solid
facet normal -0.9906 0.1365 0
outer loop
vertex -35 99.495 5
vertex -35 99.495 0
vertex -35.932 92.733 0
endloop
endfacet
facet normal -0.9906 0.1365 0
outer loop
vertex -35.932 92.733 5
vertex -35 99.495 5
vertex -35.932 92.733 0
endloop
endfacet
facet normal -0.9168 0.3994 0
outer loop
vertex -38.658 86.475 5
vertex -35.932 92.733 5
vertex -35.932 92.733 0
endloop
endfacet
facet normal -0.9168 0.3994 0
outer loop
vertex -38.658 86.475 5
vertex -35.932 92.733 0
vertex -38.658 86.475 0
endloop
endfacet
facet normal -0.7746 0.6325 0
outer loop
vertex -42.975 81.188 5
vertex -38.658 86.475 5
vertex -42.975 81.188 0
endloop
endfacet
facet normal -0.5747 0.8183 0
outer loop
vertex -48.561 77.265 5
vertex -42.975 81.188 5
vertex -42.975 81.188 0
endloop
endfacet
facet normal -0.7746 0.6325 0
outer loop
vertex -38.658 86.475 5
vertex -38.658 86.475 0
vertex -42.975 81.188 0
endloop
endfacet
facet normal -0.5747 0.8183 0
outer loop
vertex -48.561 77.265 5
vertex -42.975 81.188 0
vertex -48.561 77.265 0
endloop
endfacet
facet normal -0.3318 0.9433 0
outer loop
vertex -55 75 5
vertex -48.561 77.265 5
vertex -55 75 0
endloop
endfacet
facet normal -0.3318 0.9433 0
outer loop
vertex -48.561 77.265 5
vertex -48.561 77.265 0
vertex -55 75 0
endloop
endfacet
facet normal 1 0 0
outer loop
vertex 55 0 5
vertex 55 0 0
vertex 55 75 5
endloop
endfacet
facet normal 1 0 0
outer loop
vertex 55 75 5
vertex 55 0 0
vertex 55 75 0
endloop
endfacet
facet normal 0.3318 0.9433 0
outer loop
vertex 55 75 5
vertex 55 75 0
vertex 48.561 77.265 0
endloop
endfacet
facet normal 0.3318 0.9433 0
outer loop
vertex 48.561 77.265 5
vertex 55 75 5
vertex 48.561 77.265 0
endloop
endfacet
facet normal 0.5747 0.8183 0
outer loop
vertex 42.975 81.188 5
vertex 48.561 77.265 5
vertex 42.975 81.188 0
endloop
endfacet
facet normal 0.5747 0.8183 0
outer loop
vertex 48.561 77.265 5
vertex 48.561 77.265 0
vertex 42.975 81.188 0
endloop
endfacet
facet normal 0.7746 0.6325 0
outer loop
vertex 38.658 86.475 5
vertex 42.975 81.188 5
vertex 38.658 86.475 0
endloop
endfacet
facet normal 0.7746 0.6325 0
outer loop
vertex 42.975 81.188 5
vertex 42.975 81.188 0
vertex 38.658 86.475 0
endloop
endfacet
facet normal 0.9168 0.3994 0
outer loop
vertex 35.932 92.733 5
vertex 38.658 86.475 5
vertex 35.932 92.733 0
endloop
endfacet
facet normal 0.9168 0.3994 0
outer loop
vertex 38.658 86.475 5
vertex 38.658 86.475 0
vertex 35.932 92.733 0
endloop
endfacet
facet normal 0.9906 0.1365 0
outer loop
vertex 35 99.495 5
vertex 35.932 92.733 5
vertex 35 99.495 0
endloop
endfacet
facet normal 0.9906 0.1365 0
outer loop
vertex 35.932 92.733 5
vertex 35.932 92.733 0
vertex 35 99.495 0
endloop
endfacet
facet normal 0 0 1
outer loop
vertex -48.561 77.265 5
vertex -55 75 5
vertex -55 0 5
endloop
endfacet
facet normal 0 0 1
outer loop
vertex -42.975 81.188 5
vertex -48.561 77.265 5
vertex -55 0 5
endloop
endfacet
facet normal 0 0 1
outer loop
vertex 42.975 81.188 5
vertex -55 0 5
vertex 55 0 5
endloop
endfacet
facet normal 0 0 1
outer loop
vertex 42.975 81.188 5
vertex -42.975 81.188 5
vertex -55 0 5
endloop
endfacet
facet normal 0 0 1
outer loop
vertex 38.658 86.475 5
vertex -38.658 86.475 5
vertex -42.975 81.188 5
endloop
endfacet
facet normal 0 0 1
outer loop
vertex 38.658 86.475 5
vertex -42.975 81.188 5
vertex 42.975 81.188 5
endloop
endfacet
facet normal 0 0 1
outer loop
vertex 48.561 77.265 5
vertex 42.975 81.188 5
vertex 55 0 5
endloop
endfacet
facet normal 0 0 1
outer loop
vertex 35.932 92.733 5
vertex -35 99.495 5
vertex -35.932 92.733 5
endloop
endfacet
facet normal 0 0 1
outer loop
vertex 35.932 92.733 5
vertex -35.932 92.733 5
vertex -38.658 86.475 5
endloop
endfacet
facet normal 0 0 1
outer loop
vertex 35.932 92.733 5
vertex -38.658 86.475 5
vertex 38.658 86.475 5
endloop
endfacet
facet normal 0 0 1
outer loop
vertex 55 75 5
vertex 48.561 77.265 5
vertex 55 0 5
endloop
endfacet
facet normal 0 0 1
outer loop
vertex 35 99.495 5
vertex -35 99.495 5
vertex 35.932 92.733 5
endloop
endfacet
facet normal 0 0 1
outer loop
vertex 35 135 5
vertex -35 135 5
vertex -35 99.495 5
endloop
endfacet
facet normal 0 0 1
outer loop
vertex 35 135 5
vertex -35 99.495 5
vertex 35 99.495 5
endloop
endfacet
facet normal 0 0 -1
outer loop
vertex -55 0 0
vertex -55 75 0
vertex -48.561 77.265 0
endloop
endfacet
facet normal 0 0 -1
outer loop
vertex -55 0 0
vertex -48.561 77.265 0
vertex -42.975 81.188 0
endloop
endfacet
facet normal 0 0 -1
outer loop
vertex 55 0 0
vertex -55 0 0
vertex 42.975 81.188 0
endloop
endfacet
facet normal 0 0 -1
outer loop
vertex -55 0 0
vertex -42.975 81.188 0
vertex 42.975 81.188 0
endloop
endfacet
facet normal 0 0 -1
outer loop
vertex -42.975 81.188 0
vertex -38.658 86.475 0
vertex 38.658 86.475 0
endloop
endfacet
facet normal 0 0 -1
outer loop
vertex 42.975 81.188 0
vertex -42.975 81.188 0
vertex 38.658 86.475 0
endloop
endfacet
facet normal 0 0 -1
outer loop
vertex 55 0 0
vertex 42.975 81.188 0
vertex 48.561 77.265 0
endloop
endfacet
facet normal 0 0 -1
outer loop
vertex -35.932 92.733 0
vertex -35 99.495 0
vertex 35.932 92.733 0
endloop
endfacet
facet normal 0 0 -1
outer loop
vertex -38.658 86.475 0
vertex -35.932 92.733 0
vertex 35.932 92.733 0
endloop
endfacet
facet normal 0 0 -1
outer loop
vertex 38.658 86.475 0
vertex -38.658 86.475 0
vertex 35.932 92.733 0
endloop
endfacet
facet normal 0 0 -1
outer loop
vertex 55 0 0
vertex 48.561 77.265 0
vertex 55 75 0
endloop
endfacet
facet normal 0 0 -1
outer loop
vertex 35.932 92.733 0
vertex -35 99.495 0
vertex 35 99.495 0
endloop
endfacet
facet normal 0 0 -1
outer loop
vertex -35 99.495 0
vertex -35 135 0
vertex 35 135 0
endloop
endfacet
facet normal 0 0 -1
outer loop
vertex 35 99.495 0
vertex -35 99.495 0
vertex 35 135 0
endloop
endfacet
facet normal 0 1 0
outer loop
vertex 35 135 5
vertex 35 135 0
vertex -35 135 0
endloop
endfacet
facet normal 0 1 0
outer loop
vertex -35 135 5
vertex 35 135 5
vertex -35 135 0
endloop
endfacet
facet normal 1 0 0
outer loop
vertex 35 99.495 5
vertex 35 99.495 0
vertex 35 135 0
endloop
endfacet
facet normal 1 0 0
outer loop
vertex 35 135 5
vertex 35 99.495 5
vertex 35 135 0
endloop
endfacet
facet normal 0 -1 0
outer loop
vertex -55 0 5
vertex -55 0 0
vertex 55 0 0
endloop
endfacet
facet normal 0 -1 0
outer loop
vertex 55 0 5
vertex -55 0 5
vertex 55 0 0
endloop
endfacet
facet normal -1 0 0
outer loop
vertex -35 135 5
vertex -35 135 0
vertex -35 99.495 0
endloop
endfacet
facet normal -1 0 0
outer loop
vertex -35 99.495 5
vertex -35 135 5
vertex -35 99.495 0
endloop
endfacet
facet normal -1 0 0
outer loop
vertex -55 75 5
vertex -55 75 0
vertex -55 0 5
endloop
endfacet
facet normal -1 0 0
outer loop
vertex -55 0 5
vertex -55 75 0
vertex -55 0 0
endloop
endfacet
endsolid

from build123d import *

# Parameters (mm, degrees)
F1_DEPTH    = 5
F2_T1_DEPTH = 5


# Not quite as in the source:
# - a fillet or chamfer that OpenCascade refuses, or shapes differently, is made with other operations: its cross-section is extruded or revolved along the edge and cut away or added


with BuildPart() as f1:
    # F0 (on Top) → F1 (new body)
    with BuildSketch(Plane.XY):
        Polygon((35, 135), (-35, 135), (-35, 75), (-55, 75), (-55, 0), (55, 0), (55, 75), (35, 75), align=None)
    extrude(amount=F1_DEPTH)

    # F2: fillet of radius 25 on 2 edges, made by hand

    # F2_s2 → F2_t1 (join)
    with BuildSketch(Plane.XY):
        with BuildLine():
            ThreePointArc((-35, 99.4948974278), (-40.635083269, 83.683509127), (-55, 75))
            Line((-55, 75), (-35, 75))
            Line((-35, 75), (-35, 99.4948974278))
        make_face()
        with BuildLine():
            ThreePointArc((55, 75), (40.635083269, 83.683509127), (35, 99.4948974278))
            Line((35, 99.4948974278), (35, 75))
            Line((35, 75), (55, 75))
        make_face()
    extrude(amount=F2_T1_DEPTH)


solid = f1.part
